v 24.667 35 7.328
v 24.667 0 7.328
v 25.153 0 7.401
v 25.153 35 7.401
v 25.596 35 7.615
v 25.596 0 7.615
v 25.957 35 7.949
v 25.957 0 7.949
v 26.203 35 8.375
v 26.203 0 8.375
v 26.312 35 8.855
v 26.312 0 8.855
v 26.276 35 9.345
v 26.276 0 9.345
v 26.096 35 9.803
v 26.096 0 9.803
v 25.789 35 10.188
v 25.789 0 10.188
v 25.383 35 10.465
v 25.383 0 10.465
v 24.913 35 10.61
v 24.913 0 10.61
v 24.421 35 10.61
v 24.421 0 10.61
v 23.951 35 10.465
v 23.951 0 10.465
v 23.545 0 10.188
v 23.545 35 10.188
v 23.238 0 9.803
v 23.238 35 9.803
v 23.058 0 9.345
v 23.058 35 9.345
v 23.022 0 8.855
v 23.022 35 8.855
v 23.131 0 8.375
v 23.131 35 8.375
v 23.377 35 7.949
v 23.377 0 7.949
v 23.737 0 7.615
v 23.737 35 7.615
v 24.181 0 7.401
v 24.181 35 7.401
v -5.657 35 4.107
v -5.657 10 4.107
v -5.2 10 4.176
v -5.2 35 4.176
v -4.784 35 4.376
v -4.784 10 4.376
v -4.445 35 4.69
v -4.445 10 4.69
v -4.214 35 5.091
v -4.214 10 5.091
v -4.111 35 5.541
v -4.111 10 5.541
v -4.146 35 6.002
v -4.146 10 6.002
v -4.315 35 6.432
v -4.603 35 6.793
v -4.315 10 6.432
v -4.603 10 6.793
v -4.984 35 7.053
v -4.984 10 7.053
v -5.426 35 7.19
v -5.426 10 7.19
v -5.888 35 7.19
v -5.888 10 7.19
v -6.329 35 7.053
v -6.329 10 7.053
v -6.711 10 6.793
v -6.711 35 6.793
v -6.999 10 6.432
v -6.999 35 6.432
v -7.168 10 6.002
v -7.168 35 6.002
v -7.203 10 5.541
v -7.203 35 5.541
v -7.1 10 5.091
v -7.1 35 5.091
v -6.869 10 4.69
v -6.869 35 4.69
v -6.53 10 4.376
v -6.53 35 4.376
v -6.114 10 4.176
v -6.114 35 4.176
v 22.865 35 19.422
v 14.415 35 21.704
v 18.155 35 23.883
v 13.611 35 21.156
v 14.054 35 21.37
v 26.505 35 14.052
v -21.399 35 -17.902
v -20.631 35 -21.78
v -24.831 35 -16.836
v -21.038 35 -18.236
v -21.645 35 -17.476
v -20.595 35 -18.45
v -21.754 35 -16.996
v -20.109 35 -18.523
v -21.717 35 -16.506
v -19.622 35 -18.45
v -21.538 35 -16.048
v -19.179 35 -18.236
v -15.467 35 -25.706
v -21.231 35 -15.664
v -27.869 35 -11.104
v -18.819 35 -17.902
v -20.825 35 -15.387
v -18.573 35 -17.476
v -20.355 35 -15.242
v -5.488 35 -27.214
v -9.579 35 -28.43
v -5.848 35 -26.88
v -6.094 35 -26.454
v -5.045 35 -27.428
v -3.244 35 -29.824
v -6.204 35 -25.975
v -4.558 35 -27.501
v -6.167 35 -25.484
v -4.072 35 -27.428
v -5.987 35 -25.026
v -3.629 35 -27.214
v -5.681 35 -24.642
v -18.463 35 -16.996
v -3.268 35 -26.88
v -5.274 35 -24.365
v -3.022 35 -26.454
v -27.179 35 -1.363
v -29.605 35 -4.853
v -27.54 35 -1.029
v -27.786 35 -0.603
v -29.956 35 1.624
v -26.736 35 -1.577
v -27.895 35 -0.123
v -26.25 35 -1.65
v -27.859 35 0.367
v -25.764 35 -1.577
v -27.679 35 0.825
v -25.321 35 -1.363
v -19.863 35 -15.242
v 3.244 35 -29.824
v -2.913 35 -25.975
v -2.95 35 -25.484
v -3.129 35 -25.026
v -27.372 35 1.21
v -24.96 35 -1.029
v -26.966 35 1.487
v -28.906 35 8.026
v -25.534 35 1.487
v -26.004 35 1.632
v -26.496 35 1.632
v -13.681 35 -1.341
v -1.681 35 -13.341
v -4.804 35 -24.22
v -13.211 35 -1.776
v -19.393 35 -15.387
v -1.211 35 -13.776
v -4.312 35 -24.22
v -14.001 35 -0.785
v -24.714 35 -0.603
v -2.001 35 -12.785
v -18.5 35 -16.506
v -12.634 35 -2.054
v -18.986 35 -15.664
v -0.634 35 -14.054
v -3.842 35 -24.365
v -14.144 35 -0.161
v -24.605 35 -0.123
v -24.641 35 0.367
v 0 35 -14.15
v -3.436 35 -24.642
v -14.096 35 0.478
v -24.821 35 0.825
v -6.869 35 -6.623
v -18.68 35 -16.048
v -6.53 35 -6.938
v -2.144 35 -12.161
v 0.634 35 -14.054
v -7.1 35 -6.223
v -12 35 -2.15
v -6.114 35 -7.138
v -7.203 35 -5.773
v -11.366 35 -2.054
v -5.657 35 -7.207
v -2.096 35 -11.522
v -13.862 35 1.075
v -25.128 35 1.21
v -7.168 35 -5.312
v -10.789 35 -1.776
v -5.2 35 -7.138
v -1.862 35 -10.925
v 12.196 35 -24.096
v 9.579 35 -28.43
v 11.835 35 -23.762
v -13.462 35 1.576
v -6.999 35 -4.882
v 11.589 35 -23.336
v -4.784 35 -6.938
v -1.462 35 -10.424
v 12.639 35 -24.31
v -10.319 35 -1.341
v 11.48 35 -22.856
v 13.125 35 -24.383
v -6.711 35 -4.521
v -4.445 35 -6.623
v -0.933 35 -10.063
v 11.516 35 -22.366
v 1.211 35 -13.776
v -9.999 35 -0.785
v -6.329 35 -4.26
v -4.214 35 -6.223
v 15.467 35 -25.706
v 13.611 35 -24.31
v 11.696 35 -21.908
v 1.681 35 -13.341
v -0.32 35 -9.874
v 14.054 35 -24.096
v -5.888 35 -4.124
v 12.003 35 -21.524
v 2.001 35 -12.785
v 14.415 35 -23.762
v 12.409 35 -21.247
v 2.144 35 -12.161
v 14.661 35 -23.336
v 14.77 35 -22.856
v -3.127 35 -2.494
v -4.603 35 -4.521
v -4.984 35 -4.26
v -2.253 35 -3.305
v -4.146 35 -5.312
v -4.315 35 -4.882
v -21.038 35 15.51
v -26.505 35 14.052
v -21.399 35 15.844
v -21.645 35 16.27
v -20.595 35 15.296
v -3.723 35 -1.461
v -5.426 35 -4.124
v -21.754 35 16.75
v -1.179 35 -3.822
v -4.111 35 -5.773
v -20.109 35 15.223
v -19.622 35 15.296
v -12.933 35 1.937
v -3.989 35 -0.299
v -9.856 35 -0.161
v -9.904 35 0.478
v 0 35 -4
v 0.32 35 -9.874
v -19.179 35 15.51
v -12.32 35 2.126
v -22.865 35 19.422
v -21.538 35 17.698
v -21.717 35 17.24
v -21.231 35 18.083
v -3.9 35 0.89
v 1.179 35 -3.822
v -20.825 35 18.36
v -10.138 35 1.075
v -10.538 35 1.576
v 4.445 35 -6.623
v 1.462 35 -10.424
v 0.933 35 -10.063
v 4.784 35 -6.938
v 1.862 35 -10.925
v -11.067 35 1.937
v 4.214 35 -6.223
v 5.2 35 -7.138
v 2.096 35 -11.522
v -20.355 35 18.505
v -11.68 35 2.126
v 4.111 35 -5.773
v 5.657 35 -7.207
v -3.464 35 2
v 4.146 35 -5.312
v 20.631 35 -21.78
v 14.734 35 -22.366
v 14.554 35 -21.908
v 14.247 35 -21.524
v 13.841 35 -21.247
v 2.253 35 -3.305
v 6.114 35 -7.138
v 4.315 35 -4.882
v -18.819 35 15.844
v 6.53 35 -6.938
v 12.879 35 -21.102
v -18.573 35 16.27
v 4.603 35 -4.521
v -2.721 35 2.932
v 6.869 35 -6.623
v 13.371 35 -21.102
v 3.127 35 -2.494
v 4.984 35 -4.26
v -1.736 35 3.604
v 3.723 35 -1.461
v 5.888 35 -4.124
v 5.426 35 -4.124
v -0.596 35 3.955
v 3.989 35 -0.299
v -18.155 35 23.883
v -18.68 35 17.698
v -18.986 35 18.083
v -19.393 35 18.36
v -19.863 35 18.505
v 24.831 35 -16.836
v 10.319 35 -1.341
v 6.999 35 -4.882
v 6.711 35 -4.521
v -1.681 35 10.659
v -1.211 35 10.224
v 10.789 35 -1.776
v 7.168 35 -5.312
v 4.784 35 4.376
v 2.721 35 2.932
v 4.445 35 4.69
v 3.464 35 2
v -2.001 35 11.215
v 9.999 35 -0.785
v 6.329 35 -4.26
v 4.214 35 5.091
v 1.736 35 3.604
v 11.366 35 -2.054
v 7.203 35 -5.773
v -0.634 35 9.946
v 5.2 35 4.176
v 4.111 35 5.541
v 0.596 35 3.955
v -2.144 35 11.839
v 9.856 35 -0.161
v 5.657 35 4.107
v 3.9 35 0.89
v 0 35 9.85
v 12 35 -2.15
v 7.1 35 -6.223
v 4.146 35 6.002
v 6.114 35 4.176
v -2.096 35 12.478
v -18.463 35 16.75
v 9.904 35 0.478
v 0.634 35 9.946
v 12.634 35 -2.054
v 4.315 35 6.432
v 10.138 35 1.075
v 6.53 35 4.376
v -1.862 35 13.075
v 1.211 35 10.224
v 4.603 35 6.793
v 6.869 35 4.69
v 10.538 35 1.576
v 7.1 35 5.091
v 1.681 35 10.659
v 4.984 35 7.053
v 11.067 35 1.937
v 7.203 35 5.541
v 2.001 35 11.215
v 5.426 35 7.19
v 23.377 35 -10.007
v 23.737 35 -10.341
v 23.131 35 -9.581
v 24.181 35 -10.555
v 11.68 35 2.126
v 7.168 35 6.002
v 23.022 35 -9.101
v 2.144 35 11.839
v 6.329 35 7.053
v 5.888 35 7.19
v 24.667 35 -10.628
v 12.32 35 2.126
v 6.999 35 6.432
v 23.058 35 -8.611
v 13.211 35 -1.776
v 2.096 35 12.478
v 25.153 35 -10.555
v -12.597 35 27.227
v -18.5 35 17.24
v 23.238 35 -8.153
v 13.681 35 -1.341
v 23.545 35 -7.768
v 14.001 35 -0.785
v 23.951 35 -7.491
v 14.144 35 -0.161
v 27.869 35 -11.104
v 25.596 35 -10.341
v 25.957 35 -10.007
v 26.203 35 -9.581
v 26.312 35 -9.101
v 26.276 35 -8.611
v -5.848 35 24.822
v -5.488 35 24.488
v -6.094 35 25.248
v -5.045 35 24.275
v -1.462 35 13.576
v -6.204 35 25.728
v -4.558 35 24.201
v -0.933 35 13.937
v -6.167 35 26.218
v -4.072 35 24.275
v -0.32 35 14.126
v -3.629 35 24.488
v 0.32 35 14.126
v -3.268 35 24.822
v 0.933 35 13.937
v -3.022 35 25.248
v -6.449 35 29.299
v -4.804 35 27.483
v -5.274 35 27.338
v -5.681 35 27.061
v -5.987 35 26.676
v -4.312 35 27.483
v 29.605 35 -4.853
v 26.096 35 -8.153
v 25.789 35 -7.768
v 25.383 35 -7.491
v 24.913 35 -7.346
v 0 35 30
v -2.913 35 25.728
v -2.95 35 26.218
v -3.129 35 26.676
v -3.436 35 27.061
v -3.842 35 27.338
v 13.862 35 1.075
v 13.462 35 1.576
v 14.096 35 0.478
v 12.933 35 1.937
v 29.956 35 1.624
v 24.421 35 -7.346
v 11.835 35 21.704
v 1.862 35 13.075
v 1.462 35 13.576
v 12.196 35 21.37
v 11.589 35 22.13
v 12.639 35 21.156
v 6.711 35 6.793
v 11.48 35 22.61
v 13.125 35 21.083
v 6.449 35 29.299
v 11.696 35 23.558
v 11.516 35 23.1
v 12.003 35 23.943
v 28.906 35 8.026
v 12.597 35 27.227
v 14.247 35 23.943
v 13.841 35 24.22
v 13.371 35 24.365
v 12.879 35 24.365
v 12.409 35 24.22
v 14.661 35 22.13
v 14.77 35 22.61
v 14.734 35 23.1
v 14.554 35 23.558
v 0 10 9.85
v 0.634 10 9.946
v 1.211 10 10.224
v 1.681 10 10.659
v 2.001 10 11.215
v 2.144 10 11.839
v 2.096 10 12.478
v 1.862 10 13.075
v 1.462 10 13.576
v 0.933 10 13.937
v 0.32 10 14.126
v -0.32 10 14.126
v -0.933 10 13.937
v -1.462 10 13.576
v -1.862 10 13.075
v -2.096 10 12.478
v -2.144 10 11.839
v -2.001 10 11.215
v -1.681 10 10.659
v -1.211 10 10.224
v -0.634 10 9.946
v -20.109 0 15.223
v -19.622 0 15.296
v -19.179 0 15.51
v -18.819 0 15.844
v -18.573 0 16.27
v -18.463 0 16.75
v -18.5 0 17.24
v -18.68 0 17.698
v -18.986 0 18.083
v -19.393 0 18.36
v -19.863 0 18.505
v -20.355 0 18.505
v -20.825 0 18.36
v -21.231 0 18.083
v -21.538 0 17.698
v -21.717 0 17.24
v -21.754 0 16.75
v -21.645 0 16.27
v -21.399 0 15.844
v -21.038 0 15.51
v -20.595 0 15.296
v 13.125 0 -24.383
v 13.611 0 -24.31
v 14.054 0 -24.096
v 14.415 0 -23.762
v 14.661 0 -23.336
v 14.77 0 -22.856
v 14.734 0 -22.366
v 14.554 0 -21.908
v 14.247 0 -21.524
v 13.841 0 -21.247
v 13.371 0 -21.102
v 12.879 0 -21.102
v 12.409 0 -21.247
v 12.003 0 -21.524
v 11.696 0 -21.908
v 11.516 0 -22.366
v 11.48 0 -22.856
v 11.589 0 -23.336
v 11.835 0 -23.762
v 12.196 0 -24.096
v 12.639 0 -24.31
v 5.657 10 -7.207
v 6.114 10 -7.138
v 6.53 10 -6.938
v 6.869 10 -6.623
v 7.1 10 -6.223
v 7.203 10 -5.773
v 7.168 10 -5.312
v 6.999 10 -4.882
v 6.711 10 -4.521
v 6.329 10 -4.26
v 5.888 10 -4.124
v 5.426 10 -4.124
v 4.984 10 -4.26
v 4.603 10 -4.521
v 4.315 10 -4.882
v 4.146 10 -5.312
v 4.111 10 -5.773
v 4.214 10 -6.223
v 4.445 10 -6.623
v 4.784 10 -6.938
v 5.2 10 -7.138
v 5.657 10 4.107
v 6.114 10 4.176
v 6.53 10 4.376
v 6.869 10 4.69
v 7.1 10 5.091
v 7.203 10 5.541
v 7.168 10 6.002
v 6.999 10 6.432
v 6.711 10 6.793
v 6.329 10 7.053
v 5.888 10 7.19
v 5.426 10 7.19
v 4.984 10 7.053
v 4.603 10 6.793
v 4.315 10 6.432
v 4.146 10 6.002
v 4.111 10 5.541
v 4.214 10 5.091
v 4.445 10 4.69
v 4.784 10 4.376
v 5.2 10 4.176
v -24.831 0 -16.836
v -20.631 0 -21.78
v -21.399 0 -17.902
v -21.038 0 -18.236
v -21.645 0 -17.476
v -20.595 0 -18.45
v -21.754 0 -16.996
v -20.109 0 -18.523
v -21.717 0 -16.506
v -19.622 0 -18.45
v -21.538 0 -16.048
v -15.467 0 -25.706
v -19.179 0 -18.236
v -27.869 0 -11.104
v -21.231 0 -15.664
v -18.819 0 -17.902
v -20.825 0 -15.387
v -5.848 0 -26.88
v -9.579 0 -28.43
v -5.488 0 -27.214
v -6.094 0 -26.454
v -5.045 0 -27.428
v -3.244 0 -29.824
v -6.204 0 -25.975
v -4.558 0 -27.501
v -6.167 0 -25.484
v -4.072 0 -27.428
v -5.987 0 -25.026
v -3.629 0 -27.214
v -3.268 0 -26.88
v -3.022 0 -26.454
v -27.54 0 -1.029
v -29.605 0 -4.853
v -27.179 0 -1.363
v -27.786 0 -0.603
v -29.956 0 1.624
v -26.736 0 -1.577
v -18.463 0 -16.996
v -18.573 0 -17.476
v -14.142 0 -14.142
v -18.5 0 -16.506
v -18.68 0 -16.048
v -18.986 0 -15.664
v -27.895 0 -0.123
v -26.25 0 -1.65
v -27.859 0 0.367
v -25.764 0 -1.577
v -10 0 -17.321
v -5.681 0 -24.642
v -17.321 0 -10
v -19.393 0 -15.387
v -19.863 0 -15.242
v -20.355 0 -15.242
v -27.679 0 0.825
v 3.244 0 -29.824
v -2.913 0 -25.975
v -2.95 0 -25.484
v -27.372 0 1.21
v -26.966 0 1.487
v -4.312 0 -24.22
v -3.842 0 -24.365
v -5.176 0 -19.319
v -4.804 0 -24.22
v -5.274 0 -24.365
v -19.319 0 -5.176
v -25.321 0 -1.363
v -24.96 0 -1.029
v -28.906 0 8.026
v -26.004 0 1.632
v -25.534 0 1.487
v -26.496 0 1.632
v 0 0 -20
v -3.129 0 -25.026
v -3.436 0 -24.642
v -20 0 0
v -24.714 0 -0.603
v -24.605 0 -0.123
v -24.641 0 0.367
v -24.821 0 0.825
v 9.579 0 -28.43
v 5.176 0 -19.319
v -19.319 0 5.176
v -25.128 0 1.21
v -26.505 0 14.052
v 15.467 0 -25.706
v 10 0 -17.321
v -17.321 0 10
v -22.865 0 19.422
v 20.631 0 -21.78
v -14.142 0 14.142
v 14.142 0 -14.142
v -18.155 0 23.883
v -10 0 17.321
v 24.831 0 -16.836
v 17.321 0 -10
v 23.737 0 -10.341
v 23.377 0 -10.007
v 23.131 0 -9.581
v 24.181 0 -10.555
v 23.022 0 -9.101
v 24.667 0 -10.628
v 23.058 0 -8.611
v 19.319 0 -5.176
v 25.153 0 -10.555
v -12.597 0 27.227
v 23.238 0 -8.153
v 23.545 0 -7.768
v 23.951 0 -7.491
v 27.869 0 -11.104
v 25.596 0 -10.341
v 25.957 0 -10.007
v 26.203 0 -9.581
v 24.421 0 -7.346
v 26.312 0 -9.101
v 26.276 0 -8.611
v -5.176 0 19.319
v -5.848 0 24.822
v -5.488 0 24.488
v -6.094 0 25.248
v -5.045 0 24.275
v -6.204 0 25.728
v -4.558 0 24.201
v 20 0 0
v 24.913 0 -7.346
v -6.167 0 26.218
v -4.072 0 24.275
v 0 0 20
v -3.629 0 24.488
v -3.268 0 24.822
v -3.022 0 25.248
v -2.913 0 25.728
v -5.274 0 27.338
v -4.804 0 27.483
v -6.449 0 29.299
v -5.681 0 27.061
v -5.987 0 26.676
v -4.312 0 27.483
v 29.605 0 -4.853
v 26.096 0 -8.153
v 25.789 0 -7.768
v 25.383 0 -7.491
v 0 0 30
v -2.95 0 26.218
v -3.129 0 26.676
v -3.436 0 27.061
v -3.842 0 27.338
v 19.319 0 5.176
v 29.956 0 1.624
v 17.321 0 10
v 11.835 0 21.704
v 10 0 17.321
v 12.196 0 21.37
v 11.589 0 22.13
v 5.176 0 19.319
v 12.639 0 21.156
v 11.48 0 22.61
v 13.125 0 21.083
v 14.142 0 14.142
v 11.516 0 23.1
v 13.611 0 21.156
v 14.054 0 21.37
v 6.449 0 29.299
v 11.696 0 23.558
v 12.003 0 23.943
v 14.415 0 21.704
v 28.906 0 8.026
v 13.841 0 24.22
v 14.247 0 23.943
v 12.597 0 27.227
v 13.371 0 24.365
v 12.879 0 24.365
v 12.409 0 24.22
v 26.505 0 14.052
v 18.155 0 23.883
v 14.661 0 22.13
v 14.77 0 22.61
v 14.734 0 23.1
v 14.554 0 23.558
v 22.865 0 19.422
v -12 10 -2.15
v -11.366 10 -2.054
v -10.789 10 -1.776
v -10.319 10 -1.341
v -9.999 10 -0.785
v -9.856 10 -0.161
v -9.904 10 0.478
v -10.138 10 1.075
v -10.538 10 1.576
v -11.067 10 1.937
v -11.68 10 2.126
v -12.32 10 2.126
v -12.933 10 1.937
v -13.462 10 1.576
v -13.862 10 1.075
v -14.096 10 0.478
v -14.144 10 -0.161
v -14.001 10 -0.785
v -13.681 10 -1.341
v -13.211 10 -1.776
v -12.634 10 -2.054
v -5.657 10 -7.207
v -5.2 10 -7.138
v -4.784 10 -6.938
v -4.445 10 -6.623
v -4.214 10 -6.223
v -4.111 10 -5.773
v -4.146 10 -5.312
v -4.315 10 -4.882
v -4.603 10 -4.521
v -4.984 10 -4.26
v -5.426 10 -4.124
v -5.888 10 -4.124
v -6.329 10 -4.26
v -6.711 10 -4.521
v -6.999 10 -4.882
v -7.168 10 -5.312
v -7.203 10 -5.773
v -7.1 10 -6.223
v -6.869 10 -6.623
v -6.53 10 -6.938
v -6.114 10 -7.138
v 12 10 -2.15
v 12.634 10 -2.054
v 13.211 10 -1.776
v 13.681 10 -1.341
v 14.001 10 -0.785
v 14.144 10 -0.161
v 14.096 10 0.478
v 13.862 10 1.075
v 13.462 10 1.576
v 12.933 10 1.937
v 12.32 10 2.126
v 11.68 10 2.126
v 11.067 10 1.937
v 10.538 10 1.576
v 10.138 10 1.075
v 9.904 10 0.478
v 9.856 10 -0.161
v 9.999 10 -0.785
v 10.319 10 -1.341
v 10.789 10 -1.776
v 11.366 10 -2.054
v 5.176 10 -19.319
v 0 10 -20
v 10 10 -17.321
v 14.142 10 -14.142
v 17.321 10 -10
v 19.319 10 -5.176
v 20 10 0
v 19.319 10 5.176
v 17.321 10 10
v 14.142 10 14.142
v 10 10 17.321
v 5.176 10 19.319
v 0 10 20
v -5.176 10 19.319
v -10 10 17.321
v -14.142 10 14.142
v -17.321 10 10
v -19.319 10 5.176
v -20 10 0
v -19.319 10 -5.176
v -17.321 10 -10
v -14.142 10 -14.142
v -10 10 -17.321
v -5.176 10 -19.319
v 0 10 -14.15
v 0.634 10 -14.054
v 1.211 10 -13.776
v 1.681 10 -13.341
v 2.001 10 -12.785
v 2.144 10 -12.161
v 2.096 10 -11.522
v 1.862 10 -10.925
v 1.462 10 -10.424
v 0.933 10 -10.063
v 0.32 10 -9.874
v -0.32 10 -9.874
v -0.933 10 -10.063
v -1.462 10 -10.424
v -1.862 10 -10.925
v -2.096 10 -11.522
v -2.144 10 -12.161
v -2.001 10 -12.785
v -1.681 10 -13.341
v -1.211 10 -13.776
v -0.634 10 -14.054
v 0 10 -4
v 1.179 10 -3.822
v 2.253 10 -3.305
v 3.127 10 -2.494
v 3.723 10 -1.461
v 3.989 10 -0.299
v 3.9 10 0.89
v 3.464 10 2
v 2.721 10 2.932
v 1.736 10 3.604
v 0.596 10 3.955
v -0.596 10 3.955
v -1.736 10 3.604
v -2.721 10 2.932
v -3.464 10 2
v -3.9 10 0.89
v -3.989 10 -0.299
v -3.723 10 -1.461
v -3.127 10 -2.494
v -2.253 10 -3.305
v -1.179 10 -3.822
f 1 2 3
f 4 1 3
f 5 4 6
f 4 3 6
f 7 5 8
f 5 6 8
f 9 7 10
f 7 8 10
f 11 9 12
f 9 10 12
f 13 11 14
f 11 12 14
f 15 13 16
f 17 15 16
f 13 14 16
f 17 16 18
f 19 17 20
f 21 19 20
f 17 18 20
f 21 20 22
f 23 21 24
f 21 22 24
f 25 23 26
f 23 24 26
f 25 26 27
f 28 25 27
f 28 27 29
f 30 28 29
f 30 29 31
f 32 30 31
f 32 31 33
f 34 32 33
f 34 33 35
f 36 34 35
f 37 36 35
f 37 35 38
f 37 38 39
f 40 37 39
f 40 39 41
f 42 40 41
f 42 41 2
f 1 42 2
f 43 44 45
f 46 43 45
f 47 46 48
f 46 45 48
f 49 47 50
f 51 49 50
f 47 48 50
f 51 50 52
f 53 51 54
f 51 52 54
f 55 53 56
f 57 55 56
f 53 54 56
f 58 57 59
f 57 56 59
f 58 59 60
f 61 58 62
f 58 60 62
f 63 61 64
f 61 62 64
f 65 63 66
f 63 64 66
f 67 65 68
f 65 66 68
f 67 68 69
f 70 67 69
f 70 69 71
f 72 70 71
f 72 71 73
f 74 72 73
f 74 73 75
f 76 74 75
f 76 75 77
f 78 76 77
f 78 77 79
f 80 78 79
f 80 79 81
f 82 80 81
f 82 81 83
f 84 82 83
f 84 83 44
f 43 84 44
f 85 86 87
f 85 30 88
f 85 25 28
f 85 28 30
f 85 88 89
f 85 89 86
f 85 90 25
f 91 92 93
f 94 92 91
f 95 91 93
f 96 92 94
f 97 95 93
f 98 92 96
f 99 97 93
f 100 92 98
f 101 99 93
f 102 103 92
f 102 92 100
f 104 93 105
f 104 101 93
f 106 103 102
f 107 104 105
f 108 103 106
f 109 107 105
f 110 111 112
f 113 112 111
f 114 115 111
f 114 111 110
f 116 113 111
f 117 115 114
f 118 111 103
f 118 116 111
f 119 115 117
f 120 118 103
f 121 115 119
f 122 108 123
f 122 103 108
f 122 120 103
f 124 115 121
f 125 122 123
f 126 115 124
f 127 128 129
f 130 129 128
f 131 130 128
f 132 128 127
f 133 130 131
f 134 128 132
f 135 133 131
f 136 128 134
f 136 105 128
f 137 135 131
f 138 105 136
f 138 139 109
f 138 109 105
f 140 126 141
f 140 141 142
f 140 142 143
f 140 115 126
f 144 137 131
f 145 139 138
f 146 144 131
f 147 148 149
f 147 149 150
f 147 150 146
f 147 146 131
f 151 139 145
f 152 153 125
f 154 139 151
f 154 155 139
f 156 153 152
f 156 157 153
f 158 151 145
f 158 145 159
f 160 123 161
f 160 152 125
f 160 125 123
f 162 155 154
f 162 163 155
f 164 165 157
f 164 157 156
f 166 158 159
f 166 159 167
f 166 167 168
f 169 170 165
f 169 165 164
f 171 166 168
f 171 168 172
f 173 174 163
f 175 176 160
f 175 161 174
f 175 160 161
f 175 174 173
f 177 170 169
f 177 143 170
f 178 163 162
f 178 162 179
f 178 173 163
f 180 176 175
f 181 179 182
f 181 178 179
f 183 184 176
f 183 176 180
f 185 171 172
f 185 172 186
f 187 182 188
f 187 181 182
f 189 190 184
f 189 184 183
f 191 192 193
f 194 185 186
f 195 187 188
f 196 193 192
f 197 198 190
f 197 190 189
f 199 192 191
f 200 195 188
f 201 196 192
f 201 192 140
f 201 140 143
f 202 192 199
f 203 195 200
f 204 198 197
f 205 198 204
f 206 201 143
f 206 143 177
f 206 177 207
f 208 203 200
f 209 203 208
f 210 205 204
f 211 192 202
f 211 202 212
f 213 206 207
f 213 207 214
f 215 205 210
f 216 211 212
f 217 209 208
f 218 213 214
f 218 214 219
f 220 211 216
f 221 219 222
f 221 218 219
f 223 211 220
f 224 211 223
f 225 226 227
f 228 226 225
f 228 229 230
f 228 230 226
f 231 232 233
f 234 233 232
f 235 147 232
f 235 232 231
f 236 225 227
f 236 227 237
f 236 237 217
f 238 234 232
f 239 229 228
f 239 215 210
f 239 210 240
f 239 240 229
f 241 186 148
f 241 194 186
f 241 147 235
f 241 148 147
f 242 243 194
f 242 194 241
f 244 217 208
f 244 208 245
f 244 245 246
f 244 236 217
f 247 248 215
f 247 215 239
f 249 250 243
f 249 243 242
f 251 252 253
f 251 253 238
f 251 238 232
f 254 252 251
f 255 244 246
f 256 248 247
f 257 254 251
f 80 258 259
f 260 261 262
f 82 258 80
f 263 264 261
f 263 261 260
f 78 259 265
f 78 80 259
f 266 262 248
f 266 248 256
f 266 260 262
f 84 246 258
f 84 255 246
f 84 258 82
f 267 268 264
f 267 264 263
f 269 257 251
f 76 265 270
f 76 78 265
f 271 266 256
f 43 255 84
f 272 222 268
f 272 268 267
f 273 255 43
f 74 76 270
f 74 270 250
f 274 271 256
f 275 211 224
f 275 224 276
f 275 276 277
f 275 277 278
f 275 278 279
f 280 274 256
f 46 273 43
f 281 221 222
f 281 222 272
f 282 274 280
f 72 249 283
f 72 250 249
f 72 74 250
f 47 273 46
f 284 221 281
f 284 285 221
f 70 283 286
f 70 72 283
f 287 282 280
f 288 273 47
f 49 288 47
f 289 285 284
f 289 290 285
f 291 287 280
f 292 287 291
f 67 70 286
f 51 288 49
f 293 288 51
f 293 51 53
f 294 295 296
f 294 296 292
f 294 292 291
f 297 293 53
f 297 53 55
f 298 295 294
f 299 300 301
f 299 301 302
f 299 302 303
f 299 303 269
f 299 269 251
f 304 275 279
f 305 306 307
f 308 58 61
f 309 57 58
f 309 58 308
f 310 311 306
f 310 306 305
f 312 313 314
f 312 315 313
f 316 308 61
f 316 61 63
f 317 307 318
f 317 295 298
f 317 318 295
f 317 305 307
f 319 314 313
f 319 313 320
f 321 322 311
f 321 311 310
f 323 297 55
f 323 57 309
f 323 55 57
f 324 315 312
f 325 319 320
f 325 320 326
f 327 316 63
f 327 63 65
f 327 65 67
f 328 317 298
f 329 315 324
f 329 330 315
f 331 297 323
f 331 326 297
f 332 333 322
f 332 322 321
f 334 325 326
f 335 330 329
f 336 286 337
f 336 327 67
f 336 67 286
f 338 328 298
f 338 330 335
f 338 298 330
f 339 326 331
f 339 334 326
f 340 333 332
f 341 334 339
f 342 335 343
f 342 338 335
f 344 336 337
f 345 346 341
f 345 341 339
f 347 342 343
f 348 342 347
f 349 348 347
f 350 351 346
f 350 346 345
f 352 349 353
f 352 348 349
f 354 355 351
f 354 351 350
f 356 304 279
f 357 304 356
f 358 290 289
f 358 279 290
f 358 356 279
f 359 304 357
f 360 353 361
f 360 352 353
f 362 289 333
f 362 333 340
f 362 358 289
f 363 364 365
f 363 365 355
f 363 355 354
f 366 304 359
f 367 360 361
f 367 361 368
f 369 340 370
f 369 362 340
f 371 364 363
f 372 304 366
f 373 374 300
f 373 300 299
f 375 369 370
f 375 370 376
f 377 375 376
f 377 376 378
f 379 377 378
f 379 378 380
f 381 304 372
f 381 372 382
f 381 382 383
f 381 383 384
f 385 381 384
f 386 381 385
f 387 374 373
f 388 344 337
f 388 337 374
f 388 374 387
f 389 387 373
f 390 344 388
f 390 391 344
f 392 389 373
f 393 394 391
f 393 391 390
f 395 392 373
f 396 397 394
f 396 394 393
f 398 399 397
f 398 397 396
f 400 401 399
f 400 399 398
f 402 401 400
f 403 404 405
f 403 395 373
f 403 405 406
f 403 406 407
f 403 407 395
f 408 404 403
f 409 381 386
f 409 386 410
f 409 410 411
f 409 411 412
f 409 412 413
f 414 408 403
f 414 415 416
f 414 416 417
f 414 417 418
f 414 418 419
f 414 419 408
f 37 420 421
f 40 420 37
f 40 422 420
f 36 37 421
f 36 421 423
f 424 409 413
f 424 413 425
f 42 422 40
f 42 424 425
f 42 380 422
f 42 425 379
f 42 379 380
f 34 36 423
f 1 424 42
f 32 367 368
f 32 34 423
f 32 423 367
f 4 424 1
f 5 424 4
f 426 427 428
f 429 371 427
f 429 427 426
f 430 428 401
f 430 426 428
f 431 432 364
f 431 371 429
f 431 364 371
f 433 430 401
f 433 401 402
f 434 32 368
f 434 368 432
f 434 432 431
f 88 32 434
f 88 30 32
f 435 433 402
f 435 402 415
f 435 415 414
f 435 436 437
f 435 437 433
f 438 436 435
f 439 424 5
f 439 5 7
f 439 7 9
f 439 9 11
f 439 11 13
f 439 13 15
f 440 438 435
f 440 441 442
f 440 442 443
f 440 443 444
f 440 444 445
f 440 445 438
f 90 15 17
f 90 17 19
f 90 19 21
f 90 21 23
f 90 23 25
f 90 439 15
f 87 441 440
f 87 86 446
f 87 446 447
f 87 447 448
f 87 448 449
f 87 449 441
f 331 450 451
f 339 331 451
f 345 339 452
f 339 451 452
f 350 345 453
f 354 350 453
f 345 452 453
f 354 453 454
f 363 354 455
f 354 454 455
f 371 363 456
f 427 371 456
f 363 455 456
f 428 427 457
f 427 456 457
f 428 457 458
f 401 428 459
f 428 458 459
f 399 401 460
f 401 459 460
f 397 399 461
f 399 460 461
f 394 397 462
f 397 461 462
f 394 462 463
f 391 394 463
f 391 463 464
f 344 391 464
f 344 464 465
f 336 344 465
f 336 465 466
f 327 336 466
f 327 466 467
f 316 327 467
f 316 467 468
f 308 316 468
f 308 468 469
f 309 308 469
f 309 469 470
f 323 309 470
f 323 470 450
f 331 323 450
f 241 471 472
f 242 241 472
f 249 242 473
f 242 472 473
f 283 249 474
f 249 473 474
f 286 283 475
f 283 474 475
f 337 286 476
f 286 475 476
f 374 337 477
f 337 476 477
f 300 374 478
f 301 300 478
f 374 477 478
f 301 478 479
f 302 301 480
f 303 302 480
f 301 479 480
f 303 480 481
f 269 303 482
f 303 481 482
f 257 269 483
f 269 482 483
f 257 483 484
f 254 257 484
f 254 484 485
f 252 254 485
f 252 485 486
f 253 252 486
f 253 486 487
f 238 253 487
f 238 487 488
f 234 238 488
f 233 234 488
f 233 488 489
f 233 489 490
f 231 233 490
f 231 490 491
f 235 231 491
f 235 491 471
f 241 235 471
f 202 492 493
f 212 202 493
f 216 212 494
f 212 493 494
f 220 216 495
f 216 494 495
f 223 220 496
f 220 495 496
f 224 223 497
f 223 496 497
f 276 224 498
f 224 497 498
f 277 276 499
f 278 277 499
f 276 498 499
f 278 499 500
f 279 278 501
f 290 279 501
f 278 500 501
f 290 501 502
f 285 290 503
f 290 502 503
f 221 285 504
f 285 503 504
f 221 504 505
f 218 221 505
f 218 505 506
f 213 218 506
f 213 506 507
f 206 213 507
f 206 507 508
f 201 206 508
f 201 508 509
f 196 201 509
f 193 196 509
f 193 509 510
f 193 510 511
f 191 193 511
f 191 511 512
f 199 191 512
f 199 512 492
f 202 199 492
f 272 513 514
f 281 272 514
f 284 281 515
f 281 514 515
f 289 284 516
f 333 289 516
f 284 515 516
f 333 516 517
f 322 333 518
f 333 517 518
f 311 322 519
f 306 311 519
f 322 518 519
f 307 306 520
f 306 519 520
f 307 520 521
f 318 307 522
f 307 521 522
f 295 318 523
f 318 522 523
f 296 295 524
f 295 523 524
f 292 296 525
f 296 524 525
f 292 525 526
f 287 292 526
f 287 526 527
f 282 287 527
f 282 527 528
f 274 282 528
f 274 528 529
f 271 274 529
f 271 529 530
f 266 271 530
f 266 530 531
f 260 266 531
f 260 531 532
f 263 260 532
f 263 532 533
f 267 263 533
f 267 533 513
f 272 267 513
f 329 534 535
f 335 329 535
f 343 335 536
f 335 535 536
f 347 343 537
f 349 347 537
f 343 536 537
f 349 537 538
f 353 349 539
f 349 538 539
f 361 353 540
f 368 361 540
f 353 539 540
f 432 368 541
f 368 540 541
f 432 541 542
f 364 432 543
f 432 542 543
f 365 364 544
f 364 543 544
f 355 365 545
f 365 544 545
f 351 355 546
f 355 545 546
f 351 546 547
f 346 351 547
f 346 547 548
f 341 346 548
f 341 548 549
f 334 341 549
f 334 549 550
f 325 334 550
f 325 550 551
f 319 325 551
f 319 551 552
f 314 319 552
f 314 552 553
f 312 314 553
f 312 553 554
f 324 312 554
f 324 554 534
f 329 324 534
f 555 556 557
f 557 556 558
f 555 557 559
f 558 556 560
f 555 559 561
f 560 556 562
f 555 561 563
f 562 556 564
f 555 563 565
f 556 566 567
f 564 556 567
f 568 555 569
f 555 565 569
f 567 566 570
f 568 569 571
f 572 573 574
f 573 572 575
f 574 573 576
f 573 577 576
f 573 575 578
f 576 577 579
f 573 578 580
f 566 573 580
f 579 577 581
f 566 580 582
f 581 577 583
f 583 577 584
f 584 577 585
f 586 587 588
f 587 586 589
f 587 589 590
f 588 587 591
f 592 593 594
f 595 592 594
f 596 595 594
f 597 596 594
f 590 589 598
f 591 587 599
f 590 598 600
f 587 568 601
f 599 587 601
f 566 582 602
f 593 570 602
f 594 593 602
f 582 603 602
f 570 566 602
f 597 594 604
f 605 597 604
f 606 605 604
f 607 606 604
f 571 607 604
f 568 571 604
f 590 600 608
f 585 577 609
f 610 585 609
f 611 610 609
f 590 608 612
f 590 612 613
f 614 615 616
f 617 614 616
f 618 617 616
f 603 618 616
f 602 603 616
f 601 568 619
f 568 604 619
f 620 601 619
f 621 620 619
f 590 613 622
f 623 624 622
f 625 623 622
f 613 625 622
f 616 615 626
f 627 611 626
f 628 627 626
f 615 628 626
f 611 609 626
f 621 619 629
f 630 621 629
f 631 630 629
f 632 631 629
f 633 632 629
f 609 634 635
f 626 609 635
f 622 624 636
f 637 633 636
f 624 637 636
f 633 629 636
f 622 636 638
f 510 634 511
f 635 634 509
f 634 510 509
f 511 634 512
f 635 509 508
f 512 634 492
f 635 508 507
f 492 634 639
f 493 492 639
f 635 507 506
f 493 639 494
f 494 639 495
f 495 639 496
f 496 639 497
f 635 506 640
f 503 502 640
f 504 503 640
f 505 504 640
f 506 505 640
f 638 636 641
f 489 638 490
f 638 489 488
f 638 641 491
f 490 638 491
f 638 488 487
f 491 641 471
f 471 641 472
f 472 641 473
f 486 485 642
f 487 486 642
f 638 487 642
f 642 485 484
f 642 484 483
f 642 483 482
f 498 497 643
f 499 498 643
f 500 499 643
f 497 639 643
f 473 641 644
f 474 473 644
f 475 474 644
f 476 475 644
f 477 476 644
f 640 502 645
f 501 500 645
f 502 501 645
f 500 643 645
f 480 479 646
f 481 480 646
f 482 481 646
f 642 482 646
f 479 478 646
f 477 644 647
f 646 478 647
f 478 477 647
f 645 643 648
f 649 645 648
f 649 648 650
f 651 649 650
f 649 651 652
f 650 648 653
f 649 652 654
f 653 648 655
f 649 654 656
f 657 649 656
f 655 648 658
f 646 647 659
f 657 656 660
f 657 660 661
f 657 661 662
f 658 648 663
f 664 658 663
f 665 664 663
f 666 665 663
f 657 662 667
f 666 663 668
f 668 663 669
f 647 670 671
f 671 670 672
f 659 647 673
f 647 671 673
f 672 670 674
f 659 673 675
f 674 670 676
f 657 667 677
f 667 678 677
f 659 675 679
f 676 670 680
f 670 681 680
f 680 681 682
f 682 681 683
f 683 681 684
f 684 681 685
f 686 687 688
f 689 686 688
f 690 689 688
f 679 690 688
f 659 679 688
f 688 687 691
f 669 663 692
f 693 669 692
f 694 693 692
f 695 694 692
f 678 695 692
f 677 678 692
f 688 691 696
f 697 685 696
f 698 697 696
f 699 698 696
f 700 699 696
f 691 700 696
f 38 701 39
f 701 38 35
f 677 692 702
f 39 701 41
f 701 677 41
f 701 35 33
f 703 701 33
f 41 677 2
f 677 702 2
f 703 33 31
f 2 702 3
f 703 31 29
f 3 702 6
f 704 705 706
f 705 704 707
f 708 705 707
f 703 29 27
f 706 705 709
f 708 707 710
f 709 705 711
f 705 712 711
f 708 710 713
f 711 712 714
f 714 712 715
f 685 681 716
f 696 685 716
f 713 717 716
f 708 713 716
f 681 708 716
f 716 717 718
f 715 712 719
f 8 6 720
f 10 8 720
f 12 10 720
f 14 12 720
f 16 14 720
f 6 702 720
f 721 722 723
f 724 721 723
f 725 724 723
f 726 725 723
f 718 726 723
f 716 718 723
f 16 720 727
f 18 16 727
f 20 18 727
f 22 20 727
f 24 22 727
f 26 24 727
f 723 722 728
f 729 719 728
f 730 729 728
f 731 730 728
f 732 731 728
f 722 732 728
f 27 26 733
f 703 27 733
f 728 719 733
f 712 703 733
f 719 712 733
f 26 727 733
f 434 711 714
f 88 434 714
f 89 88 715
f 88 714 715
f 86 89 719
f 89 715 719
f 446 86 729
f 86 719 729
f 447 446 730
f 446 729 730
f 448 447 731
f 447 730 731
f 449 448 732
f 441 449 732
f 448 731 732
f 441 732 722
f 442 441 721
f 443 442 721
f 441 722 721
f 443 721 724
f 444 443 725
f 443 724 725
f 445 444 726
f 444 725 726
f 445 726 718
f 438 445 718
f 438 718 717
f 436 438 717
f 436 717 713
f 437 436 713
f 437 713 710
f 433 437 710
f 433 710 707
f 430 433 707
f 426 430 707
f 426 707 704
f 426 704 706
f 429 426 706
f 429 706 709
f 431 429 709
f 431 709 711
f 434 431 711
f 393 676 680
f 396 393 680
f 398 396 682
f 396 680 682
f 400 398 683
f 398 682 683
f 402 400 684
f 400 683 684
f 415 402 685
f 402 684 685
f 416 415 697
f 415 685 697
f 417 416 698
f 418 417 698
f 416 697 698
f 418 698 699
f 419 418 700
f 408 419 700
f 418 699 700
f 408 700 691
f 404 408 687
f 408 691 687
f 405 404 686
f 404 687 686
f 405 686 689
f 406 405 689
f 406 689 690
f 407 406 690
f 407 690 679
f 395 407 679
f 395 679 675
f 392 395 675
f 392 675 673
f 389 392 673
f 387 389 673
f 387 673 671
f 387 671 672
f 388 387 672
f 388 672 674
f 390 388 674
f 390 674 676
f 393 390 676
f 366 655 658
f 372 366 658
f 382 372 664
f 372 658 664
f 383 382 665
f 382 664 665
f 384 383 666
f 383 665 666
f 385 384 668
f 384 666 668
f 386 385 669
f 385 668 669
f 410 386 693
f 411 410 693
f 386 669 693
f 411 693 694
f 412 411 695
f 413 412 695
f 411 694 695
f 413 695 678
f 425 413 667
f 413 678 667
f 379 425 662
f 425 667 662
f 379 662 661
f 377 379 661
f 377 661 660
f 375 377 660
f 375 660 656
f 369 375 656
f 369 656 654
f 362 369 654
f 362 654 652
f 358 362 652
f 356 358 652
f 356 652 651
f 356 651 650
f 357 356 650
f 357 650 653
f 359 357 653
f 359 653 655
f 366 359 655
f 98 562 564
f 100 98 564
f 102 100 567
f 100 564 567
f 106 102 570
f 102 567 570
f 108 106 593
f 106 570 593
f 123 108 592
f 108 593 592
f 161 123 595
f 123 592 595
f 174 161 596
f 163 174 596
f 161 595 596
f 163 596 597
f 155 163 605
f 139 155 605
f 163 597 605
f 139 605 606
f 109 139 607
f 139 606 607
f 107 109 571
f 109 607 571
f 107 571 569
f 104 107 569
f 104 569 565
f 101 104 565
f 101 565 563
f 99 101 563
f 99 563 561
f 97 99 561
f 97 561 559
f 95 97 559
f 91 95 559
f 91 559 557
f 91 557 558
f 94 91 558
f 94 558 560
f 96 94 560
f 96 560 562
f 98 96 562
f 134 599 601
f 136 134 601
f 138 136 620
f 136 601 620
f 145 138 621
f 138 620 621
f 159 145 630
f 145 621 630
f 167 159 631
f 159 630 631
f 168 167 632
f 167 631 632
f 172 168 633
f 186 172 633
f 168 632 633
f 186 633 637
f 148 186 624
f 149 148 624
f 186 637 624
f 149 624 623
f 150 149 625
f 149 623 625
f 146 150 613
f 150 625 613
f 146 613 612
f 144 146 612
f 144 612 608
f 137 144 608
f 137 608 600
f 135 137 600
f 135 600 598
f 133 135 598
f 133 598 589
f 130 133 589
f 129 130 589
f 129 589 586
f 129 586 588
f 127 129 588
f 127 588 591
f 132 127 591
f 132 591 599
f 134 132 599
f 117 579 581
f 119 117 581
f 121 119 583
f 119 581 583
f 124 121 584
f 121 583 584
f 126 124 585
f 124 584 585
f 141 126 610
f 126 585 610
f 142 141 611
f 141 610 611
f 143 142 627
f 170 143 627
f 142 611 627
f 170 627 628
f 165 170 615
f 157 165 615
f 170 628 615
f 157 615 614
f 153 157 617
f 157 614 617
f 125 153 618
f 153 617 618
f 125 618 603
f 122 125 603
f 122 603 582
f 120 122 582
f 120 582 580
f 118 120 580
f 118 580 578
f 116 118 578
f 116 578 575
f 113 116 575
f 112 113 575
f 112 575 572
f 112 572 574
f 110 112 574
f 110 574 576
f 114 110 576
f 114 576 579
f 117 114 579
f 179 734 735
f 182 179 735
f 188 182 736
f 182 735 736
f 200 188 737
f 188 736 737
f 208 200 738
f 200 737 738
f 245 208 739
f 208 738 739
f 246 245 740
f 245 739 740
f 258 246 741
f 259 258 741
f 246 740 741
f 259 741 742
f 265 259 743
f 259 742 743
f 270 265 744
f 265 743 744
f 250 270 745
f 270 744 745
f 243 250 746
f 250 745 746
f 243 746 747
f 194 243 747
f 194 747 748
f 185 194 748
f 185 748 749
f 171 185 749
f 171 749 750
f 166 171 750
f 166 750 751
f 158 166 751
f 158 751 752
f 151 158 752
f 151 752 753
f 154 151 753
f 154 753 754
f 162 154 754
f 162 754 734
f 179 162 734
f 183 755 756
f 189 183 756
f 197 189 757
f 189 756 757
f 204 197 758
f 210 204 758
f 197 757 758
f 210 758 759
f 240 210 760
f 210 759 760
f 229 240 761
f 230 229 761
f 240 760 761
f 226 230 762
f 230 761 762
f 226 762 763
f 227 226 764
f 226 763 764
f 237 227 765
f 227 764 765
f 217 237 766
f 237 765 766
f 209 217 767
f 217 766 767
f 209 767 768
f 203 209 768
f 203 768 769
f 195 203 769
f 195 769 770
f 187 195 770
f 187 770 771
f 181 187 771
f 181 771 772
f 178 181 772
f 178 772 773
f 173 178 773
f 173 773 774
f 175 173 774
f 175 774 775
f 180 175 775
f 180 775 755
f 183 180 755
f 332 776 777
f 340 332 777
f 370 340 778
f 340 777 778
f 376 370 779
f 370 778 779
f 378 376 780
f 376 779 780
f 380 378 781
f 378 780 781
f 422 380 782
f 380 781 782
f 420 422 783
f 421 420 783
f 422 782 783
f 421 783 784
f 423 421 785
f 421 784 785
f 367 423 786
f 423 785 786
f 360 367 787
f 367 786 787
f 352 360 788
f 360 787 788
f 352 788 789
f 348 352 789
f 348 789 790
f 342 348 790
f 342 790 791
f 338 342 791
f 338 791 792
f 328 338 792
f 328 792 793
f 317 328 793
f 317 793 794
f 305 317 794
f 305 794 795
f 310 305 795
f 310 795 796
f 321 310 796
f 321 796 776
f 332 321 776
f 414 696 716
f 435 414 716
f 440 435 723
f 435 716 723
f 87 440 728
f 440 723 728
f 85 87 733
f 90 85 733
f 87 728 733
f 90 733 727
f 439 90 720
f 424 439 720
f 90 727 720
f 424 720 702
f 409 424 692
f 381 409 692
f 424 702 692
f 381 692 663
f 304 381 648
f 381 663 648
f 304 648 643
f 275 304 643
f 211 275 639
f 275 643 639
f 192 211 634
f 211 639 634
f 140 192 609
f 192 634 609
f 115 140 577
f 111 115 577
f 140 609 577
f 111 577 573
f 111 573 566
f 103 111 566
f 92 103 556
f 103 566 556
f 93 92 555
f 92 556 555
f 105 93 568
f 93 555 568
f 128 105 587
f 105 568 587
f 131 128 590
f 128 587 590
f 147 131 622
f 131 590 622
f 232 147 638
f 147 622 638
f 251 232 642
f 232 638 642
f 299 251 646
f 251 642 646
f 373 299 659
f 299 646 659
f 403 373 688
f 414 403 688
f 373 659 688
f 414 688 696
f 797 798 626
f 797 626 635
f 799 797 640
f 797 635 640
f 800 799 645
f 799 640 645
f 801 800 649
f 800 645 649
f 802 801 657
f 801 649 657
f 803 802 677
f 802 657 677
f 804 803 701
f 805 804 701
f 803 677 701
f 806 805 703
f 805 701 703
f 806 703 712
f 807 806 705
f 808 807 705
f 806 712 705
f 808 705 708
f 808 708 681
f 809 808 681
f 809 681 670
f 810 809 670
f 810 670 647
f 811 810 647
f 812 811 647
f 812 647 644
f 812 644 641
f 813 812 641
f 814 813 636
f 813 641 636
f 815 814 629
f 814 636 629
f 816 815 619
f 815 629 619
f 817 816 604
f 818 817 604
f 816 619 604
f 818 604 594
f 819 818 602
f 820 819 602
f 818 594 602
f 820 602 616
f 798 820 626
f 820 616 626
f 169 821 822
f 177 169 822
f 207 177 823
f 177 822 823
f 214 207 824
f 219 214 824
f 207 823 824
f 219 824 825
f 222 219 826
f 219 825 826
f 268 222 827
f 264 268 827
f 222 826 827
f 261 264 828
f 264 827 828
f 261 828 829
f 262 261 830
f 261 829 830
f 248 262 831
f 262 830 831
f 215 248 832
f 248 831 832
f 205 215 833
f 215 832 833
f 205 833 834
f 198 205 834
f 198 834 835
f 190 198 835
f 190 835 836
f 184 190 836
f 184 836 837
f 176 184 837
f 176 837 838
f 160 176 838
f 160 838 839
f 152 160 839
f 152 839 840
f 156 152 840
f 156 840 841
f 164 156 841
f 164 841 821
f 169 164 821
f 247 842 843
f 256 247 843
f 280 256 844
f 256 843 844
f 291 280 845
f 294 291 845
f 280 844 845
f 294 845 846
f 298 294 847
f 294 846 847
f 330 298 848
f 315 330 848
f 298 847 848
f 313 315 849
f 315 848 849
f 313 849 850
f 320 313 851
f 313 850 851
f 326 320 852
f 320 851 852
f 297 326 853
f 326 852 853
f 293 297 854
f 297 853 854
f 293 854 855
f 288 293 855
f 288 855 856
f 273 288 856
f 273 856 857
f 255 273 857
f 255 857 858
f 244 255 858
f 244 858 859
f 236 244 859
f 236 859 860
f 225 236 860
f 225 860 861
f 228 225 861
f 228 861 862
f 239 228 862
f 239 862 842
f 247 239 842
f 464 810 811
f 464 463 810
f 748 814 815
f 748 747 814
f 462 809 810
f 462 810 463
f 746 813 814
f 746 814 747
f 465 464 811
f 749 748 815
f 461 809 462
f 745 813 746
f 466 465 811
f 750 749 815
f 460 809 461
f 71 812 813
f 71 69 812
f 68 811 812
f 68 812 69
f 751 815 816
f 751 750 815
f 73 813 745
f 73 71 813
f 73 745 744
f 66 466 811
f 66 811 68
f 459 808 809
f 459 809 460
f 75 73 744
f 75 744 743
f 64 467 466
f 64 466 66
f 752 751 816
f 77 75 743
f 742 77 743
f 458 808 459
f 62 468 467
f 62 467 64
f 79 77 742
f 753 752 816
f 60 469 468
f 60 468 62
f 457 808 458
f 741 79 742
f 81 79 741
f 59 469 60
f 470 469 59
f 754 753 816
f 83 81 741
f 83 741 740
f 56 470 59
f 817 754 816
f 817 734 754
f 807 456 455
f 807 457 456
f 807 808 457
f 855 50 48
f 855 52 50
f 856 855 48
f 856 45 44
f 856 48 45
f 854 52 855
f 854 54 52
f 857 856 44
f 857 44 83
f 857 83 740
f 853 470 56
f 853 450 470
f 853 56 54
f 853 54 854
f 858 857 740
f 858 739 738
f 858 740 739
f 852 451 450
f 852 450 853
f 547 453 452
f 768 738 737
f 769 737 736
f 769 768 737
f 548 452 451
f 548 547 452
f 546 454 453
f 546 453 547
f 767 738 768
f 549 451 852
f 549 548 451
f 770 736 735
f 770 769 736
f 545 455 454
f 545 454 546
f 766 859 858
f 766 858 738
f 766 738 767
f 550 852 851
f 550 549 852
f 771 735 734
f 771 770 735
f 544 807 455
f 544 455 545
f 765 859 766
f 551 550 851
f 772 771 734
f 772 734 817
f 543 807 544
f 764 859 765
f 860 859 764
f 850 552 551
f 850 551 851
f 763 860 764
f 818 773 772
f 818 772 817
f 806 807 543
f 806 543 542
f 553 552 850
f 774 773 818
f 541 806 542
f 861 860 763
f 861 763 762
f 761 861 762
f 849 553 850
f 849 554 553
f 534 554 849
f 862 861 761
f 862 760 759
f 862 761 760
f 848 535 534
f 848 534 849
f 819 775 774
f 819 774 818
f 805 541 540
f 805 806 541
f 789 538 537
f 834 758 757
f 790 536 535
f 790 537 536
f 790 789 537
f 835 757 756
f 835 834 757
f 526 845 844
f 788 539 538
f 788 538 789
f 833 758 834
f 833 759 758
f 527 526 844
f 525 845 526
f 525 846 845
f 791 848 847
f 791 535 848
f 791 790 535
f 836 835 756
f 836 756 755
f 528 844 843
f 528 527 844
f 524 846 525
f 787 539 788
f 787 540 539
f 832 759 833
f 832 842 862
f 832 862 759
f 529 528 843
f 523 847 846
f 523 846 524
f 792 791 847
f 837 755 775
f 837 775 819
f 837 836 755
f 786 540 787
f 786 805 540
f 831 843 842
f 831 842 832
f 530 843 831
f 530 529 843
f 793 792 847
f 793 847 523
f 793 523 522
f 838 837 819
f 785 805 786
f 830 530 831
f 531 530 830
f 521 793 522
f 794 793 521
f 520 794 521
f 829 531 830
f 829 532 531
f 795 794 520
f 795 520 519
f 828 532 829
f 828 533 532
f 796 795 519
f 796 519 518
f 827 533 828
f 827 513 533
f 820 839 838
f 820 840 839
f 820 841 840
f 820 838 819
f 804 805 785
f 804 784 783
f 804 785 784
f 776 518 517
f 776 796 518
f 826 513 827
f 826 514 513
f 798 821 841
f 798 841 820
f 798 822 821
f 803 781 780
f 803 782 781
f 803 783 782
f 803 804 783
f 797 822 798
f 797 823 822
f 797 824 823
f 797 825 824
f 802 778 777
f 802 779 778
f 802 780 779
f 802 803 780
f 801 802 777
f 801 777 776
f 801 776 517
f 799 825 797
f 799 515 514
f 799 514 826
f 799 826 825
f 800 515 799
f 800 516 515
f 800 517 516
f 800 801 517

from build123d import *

# Parameters (mm, degrees)
SKETCH_1_R          = 30
EXTRUDE_1_DEPTH     = 35
SKETCH_2_R          = 1.65
CUT_EXTRUDE_1_DEPTH = 56
SKETCH_4_R          = 20
CUT_EXTRUDE_3_DEPTH = 10
SKETCH_5_R          = 4
CUT_EXTRUDE_4_DEPTH = 50.244289009
SKETCH_6_R          = 2.15
SKETCH_6_R_2        = 1.55
CUT_EXTRUDE_5_DEPTH = 50.244289009


with BuildPart() as part:
    # 草图1 → 凸台-拉伸1 (new body)
    with BuildSketch(Plane(origin=(0, 0, 0), x_dir=(1, 0, 0), z_dir=(0, 1, 0))):
        with Locations(Location((0, 0, 0), (0, 0, 270))):
            Circle(SKETCH_1_R)
    extrude(amount=EXTRUDE_1_DEPTH)

    # 草图2 → 切除-拉伸1 (cut, through all)
    with BuildSketch(Plane.XZ):
        with Locations(Location((-26.25, 0, 0), (0, 0, 270))):
            Circle(SKETCH_2_R)
        with Locations(Location((-20.108666632, 16.873174754, 0), (0, 0, 270))):
            Circle(SKETCH_2_R)
        with Locations(Location((-4.558264664, 25.851203517, 0), (0, 0, 270))):
            Circle(SKETCH_2_R)
        with Locations(Location((13.125, 22.733166849, 0), (0, 0, 270))):
            Circle(SKETCH_2_R)
        with Locations(Location((24.666931296, 8.978028762, 0), (0, 0, 270))):
            Circle(SKETCH_2_R)
        with Locations(Location((24.666931296, -8.978028762, 0), (0, 0, 270))):
            Circle(SKETCH_2_R)
        with Locations(Location((13.125, -22.733166849, 0), (0, 0, 270))):
            Circle(SKETCH_2_R)
        with Locations(Location((-4.558264664, -25.851203517, 0), (0, 0, 270))):
            Circle(SKETCH_2_R)
        with Locations(Location((-20.108666632, -16.873174754, 0), (0, 0, 270))):
            Circle(SKETCH_2_R)
    extrude(amount=-CUT_EXTRUDE_1_DEPTH, mode=Mode.SUBTRACT)

    # 草图4 → 切除-拉伸3 (cut)
    with BuildSketch(Plane.XZ):
        with Locations(Location((0, 0, 0), (0, 0, 270))):
            Circle(SKETCH_4_R)
    extrude(amount=-CUT_EXTRUDE_3_DEPTH, mode=Mode.SUBTRACT)

    # 草图5 → 切除-拉伸4 (cut, through all)
    with BuildSketch(Plane.XZ.offset(-10)):
        with Locations(Location((0, 0, 0), (0, 0, 270))):
            Circle(SKETCH_5_R)
    extrude(amount=-CUT_EXTRUDE_4_DEPTH, mode=Mode.SUBTRACT)

    # 草图6 → 切除-拉伸5 (cut, through all)
    with BuildSketch(Plane.XZ.offset(-10)):
        with Locations(Location((0, 12, 0), (0, 0, 270))):
            Circle(SKETCH_6_R)
        with Locations(Location((12, 0, 0), (0, 0, 270))):
            Circle(SKETCH_6_R)
        with Locations(Location((0, -12, 0), (0, 0, 270))):
            Circle(SKETCH_6_R)
        with Locations(Location((-12, 0, 0), (0, 0, 270))):
            Circle(SKETCH_6_R)
        with Locations(Location((-5.656854249, -5.656854249, 0), (0, 0, 270))):
            Circle(SKETCH_6_R_2)
        with Locations(Location((-5.656854249, 5.656854249, 0), (0, 0, 270))):
            Circle(SKETCH_6_R_2)
        with Locations(Location((5.656854249, 5.656854249, 0), (0, 0, 270))):
            Circle(SKETCH_6_R_2)
        with Locations(Location((5.656854249, -5.656854249, 0), (0, 0, 270))):
            Circle(SKETCH_6_R_2)
    extrude(amount=-CUT_EXTRUDE_5_DEPTH, mode=Mode.SUBTRACT)


solid = part.part
